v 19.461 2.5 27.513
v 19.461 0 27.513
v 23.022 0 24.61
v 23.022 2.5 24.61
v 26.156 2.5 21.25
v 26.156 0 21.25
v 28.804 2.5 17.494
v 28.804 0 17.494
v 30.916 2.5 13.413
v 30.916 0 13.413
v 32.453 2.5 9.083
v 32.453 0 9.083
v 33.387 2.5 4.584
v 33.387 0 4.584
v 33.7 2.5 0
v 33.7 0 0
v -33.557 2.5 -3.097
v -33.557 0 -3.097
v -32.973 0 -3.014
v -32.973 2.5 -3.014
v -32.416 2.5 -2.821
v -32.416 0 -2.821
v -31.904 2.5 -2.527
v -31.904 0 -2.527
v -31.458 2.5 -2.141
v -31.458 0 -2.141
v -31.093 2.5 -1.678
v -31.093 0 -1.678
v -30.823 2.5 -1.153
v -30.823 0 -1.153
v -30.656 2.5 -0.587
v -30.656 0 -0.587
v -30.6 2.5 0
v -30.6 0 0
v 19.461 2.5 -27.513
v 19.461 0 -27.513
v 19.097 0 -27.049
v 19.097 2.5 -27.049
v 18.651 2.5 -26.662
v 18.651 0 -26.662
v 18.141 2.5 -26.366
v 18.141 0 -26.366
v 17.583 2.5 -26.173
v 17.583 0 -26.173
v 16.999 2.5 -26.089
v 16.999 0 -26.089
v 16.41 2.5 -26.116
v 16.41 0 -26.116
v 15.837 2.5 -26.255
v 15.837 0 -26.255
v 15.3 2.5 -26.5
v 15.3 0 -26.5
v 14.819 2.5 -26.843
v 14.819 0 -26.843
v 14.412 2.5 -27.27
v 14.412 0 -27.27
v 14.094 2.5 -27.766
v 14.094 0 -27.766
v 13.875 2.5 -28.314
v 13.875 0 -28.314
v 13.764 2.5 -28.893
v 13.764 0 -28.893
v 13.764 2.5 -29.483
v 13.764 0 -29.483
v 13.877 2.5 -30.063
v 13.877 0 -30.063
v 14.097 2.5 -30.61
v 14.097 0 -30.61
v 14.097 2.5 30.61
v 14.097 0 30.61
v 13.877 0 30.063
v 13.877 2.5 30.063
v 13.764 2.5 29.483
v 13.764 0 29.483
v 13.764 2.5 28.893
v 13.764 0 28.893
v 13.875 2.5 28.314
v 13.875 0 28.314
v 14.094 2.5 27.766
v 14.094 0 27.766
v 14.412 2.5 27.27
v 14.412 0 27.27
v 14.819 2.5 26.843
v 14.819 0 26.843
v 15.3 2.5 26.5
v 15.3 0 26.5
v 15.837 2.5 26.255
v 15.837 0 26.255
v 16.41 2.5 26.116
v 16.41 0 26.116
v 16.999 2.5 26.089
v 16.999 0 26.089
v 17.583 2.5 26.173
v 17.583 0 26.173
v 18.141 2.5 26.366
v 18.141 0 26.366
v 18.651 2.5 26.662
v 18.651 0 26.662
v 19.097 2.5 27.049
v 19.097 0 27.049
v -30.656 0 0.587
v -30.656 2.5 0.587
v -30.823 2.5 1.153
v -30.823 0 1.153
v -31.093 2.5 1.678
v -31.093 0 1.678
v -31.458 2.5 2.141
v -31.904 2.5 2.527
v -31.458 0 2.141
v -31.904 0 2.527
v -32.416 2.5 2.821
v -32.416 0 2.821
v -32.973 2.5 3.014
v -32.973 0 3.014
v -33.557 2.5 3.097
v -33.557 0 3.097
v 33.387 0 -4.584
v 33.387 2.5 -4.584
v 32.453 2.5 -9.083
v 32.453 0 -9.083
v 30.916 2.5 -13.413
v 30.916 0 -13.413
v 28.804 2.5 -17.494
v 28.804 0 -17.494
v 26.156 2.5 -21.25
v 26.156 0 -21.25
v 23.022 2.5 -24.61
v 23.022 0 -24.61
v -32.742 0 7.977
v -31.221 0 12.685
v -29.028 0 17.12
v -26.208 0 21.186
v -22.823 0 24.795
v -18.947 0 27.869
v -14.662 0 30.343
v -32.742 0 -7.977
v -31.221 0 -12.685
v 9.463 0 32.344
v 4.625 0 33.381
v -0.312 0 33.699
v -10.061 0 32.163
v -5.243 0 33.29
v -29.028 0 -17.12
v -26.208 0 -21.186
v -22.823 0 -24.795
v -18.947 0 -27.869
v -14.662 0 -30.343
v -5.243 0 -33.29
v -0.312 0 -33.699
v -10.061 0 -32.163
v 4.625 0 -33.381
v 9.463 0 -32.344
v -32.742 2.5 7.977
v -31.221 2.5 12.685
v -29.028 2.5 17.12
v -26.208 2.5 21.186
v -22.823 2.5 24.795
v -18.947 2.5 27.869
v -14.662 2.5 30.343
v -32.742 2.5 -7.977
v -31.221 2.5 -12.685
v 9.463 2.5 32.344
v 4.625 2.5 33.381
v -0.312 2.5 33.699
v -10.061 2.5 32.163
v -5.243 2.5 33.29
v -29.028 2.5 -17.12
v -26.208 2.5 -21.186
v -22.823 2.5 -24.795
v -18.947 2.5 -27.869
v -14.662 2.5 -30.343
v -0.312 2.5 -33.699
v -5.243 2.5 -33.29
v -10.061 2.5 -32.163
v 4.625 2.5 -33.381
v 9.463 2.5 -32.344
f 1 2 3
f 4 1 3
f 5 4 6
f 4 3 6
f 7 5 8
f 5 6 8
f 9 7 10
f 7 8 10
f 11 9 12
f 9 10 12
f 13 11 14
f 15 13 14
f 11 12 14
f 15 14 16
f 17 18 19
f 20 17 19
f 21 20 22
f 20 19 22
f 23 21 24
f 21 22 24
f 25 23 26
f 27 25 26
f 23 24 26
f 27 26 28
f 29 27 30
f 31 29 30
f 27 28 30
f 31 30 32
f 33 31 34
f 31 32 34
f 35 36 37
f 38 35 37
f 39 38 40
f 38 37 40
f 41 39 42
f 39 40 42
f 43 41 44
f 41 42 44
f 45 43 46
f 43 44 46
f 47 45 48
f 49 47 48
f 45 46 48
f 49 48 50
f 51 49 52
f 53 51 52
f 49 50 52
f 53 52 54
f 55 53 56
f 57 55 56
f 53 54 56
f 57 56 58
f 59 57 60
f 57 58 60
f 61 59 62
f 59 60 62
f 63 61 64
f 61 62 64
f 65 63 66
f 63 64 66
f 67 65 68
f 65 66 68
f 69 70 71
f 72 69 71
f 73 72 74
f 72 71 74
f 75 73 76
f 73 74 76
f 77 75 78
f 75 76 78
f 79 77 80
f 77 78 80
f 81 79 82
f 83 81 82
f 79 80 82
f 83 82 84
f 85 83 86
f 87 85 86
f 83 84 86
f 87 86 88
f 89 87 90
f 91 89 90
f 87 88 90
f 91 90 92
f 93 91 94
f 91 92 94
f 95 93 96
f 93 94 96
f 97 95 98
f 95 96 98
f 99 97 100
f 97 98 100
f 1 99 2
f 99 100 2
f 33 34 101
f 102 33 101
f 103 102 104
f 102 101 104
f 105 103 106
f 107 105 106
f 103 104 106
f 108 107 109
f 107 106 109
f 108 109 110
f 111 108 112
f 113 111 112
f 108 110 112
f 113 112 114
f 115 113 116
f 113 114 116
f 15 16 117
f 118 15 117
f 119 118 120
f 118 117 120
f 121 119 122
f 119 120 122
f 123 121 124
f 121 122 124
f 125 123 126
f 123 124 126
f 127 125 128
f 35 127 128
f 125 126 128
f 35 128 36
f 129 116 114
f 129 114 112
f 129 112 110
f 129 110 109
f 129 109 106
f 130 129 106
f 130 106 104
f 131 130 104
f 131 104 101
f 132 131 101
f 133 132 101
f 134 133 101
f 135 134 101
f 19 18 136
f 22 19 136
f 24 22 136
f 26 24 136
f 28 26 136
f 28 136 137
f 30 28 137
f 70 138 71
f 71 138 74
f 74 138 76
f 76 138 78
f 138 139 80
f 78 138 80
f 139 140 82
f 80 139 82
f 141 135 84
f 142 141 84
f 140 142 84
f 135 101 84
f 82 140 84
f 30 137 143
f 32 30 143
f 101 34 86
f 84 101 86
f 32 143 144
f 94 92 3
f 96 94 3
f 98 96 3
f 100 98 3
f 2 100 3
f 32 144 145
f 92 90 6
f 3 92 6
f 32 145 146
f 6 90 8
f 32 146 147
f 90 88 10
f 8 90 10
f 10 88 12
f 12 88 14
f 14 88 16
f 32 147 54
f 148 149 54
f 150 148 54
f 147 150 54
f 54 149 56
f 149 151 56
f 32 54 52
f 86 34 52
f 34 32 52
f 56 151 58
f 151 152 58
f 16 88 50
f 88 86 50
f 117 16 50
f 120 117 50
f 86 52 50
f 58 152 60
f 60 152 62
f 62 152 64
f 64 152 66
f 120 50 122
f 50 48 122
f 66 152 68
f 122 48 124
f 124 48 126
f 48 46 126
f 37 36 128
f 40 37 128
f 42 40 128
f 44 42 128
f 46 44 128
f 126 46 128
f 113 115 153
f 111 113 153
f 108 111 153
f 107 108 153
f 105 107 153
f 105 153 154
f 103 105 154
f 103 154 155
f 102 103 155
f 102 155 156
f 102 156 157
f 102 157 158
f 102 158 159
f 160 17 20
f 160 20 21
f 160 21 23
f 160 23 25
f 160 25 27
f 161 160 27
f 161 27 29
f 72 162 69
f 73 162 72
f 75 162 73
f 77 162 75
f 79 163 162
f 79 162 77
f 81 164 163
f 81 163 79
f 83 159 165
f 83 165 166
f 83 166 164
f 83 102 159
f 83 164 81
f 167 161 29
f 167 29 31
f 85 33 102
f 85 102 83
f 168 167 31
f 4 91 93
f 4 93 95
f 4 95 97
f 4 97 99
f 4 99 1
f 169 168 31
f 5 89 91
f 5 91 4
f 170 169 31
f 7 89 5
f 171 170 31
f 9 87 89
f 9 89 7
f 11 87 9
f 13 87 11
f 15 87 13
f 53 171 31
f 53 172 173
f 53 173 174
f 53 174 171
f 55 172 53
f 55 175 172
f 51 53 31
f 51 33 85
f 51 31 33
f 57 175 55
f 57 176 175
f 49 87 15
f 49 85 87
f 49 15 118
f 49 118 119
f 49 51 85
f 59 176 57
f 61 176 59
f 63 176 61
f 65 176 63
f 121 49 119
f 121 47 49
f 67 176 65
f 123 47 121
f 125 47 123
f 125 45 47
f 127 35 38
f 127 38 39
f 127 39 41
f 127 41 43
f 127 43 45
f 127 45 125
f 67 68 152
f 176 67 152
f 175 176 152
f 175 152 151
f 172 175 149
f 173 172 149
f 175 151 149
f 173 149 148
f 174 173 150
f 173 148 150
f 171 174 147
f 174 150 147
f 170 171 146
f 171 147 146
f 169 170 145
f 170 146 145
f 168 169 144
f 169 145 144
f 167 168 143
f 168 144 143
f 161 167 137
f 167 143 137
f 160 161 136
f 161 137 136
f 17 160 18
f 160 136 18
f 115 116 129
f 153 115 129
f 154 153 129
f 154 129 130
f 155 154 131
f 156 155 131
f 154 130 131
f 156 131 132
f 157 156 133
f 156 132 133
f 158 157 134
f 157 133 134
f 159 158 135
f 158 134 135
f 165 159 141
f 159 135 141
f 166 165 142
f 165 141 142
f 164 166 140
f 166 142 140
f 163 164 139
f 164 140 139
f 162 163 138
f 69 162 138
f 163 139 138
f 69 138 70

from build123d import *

# Parameters (mm, degrees)
BOSS_EXTRU_1_DEPTH = 2.5


with BuildPart() as part:
    # Esquisse1 → Boss.-Extru.1 (new body)
    with BuildSketch(Plane(origin=(0, 0, 0), x_dir=(1, 0, 0), z_dir=(0, 1, 0))):
        with BuildLine():
            Line((33.7, 0), (-30.6, 0))
            ThreePointArc((-30.6, 0), (-31.458125453, -2.141027444), (-33.557418398, -3.09671931))
            ThreePointArc((-33.557418398, -3.09671931), (-16.85, -29.185056108), (14.096871608, -30.609936473))
            ThreePointArc((14.096871608, -30.609936473), (15.3, -26.500377356), (19.46054679, -27.513217163))
            ThreePointArc((19.46054679, -27.513217163), (29.929169942, -15.489828488), (33.7, 0))
        make_face()
        with BuildLine():
            ThreePointArc((-33.557418398, 3.09671931), (-31.458125453, 2.141027444), (-30.6, 0))
            Line((-30.6, 0), (33.7, 0))
            ThreePointArc((33.7, 0), (29.929169942, 15.489828488), (19.46054679, 27.513217163))
            ThreePointArc((19.46054679, 27.513217163), (15.3, 26.500377356), (14.096871608, 30.609936473))
            ThreePointArc((14.096871608, 30.609936473), (-16.85, 29.185056108), (-33.557418398, 3.09671931))
        make_face()
    extrude(amount=BOSS_EXTRU_1_DEPTH)


solid = part.part
